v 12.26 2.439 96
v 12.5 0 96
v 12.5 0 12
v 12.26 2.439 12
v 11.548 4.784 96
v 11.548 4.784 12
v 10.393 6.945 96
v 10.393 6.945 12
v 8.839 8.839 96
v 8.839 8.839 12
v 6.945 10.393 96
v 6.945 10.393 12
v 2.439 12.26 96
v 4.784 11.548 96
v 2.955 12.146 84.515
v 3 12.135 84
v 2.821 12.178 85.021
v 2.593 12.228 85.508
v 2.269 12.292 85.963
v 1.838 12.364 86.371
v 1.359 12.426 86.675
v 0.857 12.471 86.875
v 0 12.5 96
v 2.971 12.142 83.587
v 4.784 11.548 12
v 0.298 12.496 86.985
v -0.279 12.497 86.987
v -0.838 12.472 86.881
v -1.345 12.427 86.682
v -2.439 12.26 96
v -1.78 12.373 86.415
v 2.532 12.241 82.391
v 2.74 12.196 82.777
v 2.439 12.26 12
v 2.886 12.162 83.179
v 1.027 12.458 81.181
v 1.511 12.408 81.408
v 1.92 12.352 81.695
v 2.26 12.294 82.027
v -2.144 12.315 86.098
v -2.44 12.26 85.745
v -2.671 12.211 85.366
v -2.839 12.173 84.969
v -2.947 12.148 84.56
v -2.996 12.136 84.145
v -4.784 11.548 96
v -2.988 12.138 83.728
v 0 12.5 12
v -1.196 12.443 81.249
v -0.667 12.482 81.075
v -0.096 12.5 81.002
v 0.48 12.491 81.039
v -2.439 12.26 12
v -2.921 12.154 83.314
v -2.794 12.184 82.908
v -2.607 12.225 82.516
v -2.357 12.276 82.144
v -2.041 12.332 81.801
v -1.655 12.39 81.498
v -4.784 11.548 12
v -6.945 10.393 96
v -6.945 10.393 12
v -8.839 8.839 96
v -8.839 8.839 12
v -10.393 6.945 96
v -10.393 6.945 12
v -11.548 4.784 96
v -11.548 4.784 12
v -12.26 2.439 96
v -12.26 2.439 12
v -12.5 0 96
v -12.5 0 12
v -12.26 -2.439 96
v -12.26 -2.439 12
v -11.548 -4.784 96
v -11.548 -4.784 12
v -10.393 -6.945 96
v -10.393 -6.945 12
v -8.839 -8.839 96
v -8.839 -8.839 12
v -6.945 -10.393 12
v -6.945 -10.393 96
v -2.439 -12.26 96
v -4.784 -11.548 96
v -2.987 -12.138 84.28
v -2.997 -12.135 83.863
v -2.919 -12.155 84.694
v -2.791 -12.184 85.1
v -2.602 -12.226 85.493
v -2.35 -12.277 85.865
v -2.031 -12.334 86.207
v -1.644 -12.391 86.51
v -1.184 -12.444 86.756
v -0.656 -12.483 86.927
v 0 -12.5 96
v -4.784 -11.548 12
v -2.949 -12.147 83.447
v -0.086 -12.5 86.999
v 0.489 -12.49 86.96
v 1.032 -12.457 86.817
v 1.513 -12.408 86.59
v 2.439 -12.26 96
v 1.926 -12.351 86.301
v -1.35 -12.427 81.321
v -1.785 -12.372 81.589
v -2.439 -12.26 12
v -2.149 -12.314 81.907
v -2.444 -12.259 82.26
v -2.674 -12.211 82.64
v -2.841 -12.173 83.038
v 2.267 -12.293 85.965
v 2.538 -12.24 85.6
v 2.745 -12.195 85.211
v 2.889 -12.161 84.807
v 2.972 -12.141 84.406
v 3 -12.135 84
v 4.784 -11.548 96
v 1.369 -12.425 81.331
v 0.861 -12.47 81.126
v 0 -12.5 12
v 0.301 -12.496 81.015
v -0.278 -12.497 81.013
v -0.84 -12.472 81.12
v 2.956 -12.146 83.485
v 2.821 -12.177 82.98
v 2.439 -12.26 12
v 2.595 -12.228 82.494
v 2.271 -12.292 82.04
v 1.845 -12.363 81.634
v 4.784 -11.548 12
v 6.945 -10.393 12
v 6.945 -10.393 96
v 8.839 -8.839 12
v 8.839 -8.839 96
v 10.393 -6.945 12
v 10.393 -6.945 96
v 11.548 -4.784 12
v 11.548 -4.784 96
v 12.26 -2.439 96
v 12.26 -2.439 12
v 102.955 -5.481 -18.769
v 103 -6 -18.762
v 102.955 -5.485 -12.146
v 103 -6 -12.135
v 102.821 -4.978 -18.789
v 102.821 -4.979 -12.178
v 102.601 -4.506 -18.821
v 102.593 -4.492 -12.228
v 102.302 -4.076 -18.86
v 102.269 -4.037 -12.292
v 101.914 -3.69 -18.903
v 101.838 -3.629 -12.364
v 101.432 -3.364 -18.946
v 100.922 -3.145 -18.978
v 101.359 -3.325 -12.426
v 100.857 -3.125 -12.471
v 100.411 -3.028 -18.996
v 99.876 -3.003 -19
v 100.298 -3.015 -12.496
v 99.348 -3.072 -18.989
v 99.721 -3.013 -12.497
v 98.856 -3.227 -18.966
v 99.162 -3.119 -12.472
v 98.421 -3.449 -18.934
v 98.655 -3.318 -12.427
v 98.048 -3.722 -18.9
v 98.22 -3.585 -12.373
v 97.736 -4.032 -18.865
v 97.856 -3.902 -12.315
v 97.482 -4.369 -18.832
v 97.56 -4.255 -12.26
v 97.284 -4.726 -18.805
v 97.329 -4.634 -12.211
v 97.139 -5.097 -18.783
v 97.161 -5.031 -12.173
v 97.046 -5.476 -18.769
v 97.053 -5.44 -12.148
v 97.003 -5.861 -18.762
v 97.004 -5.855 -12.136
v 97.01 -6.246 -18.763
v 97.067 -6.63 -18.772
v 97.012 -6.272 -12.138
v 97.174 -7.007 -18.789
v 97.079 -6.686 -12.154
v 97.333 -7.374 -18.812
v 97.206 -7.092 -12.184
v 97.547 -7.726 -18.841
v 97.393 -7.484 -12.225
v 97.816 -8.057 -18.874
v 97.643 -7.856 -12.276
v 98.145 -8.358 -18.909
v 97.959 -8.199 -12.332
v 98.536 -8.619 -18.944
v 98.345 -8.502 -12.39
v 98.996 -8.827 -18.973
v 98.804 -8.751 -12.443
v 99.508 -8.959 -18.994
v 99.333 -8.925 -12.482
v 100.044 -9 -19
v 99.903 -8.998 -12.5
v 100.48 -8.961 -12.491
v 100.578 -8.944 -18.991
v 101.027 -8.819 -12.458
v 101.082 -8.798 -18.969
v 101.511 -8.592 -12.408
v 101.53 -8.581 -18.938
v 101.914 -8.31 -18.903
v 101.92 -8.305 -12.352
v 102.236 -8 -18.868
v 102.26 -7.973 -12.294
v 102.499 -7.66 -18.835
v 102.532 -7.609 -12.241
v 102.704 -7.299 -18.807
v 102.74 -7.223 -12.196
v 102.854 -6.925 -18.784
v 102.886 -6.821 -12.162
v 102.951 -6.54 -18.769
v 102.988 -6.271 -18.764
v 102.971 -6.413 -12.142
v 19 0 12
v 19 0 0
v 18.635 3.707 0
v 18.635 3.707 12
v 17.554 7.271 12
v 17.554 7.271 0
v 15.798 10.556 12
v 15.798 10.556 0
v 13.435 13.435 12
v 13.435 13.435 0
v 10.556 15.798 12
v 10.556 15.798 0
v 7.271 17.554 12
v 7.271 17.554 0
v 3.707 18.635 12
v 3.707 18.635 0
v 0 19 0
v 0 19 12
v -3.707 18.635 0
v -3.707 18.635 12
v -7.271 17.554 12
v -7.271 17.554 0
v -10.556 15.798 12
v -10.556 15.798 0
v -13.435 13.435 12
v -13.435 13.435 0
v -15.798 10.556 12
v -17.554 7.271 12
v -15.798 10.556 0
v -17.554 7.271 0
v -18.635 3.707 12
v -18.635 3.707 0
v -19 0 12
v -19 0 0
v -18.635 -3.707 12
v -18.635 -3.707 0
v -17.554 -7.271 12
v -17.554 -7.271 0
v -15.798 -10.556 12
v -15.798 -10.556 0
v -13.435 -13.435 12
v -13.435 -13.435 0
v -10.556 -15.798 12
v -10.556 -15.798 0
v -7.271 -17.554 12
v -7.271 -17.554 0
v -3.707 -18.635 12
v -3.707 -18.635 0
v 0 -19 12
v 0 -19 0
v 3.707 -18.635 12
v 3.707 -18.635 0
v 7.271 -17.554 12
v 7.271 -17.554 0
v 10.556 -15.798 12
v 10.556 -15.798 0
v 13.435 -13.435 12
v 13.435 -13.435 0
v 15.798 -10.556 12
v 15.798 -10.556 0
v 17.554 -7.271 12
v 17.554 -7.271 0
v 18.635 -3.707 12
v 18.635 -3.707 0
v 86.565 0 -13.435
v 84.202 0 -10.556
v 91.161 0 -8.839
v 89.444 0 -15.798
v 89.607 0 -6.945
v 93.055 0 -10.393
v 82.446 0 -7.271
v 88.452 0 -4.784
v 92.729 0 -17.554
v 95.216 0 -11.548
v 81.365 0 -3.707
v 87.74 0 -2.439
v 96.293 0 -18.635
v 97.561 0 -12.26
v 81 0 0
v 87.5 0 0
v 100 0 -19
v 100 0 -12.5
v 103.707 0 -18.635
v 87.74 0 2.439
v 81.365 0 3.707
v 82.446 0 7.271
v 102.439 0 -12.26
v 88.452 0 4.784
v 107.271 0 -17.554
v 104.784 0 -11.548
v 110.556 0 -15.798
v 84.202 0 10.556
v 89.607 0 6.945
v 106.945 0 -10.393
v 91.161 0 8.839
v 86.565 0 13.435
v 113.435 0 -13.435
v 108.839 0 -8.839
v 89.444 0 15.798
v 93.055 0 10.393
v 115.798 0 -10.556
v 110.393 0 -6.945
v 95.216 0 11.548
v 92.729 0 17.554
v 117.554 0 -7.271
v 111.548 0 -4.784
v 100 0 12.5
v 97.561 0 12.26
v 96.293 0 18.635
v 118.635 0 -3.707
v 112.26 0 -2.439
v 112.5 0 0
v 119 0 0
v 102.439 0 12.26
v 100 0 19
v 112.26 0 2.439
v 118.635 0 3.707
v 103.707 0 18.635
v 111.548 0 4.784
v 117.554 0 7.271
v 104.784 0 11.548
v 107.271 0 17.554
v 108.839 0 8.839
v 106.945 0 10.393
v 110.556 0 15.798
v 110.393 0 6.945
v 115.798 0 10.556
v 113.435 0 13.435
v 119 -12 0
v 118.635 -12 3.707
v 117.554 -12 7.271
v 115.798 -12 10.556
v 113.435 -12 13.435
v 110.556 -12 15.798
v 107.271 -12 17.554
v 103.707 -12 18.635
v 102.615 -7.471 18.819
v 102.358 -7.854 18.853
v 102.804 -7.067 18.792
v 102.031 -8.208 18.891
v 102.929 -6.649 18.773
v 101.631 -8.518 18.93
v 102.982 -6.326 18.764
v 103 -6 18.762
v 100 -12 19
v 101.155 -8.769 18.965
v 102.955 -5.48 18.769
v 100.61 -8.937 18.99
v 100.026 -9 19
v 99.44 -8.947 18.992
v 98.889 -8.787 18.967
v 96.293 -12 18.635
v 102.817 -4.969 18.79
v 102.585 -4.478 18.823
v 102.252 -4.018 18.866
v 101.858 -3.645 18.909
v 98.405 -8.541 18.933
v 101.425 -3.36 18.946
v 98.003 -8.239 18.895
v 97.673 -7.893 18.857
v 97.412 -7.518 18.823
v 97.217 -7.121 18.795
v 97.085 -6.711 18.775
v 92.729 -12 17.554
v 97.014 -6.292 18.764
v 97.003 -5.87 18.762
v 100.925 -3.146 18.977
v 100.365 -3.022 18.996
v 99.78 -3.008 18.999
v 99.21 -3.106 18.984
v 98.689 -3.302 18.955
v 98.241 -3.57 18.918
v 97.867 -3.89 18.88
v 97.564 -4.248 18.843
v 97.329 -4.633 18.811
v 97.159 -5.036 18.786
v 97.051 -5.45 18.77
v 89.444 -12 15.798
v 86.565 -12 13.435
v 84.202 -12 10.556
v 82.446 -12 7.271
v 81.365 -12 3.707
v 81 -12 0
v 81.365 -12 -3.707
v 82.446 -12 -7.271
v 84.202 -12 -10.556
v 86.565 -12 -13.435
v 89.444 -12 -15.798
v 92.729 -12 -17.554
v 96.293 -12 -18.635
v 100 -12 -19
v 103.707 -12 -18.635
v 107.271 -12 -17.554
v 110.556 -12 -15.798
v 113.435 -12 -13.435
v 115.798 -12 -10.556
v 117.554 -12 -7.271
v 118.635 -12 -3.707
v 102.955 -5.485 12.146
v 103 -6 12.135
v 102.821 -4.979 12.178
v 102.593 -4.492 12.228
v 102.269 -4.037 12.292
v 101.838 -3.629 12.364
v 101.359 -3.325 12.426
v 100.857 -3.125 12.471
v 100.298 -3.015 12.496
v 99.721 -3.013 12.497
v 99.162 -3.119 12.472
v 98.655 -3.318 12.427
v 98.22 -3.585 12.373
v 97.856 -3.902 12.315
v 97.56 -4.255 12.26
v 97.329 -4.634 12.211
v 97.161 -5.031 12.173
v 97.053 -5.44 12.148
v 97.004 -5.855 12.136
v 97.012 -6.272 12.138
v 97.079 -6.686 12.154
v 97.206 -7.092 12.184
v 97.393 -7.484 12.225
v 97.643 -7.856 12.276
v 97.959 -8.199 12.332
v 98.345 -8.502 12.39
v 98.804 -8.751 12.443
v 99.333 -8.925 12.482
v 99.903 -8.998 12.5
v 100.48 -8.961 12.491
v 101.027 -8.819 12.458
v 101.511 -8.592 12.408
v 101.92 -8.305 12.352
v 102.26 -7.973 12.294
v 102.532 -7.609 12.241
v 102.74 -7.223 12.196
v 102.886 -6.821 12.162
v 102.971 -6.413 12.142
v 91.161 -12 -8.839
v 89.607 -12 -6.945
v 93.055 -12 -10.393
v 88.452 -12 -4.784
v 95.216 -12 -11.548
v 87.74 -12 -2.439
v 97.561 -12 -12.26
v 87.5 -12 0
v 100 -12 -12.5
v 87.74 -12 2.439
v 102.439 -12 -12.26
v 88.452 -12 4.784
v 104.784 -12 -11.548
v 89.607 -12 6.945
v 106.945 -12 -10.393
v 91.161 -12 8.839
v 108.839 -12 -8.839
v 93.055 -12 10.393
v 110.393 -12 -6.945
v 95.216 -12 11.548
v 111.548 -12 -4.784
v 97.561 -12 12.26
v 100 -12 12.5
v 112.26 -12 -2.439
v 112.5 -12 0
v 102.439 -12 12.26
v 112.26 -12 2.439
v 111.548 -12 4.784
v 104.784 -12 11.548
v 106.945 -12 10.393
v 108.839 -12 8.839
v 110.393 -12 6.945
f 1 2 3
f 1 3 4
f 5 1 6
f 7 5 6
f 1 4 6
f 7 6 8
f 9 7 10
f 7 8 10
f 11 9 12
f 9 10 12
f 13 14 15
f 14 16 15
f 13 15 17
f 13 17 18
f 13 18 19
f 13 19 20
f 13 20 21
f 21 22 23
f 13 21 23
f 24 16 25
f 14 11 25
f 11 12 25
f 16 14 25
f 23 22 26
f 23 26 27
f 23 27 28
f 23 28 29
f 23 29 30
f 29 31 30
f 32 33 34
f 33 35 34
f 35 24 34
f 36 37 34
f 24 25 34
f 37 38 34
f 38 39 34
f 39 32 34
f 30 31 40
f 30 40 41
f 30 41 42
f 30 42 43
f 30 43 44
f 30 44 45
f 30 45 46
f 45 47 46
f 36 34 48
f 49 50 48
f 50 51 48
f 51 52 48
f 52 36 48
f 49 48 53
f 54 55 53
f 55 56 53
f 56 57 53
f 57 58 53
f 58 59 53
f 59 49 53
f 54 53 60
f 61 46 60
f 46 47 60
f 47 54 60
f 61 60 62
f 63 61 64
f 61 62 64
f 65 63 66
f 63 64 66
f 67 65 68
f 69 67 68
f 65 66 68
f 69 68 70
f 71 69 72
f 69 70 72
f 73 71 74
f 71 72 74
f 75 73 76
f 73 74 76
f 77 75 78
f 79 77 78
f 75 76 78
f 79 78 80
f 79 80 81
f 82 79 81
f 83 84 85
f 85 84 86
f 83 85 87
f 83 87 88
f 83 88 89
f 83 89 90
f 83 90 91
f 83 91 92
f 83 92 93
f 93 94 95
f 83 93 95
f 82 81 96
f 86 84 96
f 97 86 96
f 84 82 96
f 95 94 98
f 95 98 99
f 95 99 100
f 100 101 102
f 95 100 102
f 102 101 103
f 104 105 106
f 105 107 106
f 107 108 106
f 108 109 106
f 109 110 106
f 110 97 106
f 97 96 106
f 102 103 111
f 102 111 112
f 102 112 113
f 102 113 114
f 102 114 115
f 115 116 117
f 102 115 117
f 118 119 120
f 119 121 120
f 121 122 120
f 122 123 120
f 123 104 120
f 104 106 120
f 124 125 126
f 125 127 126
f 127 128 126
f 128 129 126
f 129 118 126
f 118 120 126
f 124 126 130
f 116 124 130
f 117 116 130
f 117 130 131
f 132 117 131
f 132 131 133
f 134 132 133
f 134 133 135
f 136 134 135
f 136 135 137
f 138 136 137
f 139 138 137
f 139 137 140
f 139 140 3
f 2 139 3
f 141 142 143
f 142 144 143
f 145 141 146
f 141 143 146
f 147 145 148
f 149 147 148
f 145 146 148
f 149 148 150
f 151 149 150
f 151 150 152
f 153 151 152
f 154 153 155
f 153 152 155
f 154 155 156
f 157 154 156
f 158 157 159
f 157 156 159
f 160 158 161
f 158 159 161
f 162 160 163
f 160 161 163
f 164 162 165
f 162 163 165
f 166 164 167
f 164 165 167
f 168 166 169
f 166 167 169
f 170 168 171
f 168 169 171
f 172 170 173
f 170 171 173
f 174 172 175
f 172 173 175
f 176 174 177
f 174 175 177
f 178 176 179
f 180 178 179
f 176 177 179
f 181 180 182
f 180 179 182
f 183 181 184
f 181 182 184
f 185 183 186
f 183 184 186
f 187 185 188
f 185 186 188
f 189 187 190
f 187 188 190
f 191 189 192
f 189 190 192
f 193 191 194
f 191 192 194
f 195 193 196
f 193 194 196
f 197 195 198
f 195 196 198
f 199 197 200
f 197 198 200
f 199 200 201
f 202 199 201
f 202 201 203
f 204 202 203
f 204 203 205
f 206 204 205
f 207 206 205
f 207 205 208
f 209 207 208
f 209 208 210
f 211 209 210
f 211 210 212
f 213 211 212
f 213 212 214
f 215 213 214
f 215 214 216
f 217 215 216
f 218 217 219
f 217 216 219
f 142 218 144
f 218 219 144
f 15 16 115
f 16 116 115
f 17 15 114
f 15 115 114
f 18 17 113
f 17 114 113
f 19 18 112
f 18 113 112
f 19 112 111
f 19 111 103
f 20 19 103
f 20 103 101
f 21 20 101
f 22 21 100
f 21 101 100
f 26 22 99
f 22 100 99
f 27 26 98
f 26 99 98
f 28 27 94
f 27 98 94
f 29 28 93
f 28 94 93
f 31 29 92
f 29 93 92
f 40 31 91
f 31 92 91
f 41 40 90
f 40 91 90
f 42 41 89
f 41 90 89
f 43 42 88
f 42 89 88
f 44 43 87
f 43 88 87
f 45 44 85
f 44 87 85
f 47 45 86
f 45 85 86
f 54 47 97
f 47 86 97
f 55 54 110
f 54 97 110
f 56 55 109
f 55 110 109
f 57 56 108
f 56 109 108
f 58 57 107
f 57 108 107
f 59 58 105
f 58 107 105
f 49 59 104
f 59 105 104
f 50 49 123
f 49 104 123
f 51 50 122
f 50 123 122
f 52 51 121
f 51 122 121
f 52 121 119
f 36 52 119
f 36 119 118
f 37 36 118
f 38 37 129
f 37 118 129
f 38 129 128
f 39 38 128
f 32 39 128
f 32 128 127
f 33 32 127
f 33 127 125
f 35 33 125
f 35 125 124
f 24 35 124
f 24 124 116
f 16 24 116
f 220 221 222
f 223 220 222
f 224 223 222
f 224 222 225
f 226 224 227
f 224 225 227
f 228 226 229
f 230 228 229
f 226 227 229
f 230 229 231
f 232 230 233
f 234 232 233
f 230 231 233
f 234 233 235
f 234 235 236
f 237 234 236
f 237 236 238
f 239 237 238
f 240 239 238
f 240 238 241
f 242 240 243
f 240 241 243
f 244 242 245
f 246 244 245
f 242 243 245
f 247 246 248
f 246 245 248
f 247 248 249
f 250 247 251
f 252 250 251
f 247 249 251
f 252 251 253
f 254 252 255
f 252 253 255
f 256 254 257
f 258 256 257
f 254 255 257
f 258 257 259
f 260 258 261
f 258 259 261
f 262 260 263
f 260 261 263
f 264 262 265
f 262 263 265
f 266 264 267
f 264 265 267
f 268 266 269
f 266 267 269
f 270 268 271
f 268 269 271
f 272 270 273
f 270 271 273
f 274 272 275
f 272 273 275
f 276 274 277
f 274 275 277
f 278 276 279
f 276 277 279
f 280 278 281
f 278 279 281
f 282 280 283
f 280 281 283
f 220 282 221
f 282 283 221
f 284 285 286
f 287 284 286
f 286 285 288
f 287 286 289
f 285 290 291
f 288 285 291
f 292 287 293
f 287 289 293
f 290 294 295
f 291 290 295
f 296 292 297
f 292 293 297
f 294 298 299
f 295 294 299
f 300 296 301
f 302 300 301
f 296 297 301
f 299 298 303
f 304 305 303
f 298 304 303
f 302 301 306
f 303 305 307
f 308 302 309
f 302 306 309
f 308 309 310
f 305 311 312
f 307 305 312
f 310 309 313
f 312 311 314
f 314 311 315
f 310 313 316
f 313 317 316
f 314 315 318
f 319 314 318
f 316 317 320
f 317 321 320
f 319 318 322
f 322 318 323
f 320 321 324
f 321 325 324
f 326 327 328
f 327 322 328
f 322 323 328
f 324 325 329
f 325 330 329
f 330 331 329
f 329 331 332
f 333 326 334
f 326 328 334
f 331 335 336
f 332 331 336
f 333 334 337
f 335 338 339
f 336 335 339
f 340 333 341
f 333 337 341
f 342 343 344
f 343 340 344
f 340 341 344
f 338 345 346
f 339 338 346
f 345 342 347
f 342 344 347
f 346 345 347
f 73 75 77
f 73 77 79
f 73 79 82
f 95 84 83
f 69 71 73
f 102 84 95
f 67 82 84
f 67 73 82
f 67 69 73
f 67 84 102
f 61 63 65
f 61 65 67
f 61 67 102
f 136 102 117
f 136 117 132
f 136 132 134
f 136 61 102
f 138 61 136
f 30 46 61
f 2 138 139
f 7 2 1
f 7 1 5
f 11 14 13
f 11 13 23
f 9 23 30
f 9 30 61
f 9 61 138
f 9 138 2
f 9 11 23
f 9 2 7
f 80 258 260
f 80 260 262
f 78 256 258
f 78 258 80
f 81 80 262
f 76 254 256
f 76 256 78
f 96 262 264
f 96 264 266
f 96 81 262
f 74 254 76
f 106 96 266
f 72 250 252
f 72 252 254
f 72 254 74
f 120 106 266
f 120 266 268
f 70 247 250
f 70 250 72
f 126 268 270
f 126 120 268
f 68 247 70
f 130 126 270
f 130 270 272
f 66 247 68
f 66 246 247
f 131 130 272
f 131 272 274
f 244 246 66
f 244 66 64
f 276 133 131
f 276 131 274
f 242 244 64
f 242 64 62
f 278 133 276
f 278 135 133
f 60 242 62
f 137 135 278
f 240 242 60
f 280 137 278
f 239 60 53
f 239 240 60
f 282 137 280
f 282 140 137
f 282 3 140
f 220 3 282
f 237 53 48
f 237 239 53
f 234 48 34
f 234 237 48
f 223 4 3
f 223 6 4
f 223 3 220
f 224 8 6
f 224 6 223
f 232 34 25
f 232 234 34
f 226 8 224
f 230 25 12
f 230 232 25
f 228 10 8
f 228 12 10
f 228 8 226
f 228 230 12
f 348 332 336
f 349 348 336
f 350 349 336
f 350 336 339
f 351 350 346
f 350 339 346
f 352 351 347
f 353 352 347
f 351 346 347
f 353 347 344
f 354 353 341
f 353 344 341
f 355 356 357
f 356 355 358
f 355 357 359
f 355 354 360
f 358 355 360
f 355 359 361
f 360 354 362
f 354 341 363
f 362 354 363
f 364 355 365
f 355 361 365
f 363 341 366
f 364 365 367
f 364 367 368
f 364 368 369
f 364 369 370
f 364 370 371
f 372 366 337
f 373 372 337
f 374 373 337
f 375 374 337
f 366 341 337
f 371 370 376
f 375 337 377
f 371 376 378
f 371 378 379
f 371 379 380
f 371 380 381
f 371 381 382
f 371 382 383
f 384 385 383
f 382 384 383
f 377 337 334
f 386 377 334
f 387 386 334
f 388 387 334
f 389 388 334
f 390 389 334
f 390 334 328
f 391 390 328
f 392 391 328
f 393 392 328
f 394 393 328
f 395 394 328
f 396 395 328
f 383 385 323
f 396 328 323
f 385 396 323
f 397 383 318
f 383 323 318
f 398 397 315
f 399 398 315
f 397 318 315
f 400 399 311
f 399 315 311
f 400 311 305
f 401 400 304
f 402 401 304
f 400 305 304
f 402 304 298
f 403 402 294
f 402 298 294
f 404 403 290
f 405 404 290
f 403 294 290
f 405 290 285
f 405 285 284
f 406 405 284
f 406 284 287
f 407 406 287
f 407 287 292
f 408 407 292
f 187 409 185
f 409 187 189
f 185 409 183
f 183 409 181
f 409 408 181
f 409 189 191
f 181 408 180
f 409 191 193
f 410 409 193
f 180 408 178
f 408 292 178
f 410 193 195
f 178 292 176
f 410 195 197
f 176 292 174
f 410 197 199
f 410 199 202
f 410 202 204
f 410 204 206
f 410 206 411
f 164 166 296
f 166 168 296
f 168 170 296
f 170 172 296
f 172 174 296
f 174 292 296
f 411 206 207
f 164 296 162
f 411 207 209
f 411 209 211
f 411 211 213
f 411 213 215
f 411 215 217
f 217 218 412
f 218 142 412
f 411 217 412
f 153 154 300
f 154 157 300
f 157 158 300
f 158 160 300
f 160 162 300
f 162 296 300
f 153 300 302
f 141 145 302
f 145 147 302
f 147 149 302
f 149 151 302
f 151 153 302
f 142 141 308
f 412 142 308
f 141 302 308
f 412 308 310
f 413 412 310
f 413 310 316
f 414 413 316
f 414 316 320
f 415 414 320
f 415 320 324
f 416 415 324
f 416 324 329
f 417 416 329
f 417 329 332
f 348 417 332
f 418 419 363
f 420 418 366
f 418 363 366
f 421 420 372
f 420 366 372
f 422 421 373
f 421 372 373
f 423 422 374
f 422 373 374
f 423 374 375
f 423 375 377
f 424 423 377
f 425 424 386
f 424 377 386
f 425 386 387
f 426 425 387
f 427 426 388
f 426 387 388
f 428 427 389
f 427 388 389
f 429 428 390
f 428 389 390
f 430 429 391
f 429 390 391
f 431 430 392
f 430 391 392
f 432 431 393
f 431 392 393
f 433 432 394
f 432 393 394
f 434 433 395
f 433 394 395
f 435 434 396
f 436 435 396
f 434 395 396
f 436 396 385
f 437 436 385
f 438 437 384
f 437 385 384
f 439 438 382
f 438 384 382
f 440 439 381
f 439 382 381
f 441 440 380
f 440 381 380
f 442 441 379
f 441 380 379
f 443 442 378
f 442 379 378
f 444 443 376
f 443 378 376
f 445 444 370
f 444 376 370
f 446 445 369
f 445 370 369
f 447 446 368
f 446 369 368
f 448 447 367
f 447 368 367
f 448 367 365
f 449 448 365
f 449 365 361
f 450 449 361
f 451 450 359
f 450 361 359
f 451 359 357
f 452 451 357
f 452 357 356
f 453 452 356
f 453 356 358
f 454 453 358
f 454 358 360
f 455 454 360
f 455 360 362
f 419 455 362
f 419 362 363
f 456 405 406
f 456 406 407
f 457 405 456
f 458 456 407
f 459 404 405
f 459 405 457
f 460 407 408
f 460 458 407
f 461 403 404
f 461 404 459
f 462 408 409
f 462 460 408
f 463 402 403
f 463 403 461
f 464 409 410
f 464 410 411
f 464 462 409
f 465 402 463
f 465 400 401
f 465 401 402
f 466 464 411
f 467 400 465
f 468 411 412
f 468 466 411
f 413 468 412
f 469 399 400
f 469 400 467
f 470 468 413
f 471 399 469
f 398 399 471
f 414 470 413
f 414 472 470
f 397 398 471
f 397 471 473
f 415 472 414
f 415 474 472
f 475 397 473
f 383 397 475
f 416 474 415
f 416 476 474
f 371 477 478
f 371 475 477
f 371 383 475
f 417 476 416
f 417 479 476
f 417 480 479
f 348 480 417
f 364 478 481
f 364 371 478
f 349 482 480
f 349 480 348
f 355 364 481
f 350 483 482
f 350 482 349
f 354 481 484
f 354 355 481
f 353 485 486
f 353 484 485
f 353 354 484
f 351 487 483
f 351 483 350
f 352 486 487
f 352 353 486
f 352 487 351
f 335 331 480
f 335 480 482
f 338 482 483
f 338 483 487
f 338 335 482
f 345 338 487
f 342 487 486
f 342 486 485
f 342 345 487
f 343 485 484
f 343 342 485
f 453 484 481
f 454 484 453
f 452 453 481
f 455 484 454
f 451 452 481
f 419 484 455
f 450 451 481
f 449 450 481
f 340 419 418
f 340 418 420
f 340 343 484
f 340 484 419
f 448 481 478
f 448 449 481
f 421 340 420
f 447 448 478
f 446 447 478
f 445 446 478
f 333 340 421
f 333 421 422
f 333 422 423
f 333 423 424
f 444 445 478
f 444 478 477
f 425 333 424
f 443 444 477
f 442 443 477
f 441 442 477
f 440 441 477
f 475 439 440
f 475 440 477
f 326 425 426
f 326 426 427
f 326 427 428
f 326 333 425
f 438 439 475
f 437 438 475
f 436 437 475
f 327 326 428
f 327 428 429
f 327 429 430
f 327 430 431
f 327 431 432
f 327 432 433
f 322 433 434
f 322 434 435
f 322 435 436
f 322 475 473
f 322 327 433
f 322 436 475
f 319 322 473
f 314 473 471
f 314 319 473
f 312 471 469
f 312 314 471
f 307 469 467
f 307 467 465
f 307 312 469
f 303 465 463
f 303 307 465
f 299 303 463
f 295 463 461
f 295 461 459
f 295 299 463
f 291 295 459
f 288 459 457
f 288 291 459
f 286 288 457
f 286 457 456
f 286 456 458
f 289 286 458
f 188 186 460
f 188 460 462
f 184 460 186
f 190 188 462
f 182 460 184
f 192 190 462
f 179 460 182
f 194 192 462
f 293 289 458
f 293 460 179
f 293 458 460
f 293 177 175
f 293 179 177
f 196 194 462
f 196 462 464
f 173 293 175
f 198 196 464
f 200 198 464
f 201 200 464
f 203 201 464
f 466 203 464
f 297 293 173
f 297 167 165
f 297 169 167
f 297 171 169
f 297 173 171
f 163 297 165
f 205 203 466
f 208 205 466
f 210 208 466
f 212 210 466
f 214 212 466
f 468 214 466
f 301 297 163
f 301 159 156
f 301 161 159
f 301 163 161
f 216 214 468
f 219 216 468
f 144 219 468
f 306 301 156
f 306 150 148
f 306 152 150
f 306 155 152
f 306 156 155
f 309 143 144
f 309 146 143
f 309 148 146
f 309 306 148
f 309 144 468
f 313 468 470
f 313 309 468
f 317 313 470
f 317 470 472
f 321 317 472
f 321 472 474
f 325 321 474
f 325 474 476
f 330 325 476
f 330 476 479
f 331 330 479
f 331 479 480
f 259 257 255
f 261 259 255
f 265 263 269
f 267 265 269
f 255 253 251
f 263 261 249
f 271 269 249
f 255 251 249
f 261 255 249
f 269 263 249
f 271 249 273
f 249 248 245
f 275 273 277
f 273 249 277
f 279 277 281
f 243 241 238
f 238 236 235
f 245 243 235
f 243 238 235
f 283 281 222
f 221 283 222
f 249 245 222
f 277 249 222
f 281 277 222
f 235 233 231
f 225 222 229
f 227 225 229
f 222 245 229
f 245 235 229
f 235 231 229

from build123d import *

# Parameters (mm, degrees)
F0_R     = 12.5
F1_DEPTH = 96
F0_R_2   = 19
F2_DEPTH = 12
F3_R     = 19
F3_R_2   = 12.5
F4_DEPTH = 12
F5_R     = 3
F6_DEPTH = 12.5
F7_R     = 3
F8_DEPTH = 36.2


with BuildPart() as f1:
    # F0 (on Top) → F1 (new body)
    with BuildSketch(Plane.XY):
        Circle(F0_R)
    extrude(amount=F1_DEPTH)

    # F0 (on Top) → F2 (join)
    with BuildSketch(Plane.XY):
        Circle(F0_R_2)
        Circle(F0_R, mode=Mode.SUBTRACT)
    extrude(amount=F2_DEPTH)

    # F5 (on Front) → F6 (cut, symmetric)
    with BuildSketch(Plane.XZ):
        with Locations((0, 84)):
            Circle(F5_R)
    extrude(amount=F6_DEPTH, both=True, mode=Mode.SUBTRACT)


with BuildPart() as f4:
    # F3 (on Front) → F4 (new body)
    with BuildSketch(Plane.XZ):
        with Locations((100, 0)):
            Circle(F3_R)
        with Locations((100, 0)):
            Circle(F3_R_2, mode=Mode.SUBTRACT)
    extrude(amount=F4_DEPTH)

    # F7 (on Top) → F8 (cut, symmetric)
    with BuildSketch(Plane.XY):
        with Locations((100, -6)):
            Circle(F7_R)
    extrude(amount=F8_DEPTH, both=True, mode=Mode.SUBTRACT)


solid = Compound([f1.part, f4.part])
